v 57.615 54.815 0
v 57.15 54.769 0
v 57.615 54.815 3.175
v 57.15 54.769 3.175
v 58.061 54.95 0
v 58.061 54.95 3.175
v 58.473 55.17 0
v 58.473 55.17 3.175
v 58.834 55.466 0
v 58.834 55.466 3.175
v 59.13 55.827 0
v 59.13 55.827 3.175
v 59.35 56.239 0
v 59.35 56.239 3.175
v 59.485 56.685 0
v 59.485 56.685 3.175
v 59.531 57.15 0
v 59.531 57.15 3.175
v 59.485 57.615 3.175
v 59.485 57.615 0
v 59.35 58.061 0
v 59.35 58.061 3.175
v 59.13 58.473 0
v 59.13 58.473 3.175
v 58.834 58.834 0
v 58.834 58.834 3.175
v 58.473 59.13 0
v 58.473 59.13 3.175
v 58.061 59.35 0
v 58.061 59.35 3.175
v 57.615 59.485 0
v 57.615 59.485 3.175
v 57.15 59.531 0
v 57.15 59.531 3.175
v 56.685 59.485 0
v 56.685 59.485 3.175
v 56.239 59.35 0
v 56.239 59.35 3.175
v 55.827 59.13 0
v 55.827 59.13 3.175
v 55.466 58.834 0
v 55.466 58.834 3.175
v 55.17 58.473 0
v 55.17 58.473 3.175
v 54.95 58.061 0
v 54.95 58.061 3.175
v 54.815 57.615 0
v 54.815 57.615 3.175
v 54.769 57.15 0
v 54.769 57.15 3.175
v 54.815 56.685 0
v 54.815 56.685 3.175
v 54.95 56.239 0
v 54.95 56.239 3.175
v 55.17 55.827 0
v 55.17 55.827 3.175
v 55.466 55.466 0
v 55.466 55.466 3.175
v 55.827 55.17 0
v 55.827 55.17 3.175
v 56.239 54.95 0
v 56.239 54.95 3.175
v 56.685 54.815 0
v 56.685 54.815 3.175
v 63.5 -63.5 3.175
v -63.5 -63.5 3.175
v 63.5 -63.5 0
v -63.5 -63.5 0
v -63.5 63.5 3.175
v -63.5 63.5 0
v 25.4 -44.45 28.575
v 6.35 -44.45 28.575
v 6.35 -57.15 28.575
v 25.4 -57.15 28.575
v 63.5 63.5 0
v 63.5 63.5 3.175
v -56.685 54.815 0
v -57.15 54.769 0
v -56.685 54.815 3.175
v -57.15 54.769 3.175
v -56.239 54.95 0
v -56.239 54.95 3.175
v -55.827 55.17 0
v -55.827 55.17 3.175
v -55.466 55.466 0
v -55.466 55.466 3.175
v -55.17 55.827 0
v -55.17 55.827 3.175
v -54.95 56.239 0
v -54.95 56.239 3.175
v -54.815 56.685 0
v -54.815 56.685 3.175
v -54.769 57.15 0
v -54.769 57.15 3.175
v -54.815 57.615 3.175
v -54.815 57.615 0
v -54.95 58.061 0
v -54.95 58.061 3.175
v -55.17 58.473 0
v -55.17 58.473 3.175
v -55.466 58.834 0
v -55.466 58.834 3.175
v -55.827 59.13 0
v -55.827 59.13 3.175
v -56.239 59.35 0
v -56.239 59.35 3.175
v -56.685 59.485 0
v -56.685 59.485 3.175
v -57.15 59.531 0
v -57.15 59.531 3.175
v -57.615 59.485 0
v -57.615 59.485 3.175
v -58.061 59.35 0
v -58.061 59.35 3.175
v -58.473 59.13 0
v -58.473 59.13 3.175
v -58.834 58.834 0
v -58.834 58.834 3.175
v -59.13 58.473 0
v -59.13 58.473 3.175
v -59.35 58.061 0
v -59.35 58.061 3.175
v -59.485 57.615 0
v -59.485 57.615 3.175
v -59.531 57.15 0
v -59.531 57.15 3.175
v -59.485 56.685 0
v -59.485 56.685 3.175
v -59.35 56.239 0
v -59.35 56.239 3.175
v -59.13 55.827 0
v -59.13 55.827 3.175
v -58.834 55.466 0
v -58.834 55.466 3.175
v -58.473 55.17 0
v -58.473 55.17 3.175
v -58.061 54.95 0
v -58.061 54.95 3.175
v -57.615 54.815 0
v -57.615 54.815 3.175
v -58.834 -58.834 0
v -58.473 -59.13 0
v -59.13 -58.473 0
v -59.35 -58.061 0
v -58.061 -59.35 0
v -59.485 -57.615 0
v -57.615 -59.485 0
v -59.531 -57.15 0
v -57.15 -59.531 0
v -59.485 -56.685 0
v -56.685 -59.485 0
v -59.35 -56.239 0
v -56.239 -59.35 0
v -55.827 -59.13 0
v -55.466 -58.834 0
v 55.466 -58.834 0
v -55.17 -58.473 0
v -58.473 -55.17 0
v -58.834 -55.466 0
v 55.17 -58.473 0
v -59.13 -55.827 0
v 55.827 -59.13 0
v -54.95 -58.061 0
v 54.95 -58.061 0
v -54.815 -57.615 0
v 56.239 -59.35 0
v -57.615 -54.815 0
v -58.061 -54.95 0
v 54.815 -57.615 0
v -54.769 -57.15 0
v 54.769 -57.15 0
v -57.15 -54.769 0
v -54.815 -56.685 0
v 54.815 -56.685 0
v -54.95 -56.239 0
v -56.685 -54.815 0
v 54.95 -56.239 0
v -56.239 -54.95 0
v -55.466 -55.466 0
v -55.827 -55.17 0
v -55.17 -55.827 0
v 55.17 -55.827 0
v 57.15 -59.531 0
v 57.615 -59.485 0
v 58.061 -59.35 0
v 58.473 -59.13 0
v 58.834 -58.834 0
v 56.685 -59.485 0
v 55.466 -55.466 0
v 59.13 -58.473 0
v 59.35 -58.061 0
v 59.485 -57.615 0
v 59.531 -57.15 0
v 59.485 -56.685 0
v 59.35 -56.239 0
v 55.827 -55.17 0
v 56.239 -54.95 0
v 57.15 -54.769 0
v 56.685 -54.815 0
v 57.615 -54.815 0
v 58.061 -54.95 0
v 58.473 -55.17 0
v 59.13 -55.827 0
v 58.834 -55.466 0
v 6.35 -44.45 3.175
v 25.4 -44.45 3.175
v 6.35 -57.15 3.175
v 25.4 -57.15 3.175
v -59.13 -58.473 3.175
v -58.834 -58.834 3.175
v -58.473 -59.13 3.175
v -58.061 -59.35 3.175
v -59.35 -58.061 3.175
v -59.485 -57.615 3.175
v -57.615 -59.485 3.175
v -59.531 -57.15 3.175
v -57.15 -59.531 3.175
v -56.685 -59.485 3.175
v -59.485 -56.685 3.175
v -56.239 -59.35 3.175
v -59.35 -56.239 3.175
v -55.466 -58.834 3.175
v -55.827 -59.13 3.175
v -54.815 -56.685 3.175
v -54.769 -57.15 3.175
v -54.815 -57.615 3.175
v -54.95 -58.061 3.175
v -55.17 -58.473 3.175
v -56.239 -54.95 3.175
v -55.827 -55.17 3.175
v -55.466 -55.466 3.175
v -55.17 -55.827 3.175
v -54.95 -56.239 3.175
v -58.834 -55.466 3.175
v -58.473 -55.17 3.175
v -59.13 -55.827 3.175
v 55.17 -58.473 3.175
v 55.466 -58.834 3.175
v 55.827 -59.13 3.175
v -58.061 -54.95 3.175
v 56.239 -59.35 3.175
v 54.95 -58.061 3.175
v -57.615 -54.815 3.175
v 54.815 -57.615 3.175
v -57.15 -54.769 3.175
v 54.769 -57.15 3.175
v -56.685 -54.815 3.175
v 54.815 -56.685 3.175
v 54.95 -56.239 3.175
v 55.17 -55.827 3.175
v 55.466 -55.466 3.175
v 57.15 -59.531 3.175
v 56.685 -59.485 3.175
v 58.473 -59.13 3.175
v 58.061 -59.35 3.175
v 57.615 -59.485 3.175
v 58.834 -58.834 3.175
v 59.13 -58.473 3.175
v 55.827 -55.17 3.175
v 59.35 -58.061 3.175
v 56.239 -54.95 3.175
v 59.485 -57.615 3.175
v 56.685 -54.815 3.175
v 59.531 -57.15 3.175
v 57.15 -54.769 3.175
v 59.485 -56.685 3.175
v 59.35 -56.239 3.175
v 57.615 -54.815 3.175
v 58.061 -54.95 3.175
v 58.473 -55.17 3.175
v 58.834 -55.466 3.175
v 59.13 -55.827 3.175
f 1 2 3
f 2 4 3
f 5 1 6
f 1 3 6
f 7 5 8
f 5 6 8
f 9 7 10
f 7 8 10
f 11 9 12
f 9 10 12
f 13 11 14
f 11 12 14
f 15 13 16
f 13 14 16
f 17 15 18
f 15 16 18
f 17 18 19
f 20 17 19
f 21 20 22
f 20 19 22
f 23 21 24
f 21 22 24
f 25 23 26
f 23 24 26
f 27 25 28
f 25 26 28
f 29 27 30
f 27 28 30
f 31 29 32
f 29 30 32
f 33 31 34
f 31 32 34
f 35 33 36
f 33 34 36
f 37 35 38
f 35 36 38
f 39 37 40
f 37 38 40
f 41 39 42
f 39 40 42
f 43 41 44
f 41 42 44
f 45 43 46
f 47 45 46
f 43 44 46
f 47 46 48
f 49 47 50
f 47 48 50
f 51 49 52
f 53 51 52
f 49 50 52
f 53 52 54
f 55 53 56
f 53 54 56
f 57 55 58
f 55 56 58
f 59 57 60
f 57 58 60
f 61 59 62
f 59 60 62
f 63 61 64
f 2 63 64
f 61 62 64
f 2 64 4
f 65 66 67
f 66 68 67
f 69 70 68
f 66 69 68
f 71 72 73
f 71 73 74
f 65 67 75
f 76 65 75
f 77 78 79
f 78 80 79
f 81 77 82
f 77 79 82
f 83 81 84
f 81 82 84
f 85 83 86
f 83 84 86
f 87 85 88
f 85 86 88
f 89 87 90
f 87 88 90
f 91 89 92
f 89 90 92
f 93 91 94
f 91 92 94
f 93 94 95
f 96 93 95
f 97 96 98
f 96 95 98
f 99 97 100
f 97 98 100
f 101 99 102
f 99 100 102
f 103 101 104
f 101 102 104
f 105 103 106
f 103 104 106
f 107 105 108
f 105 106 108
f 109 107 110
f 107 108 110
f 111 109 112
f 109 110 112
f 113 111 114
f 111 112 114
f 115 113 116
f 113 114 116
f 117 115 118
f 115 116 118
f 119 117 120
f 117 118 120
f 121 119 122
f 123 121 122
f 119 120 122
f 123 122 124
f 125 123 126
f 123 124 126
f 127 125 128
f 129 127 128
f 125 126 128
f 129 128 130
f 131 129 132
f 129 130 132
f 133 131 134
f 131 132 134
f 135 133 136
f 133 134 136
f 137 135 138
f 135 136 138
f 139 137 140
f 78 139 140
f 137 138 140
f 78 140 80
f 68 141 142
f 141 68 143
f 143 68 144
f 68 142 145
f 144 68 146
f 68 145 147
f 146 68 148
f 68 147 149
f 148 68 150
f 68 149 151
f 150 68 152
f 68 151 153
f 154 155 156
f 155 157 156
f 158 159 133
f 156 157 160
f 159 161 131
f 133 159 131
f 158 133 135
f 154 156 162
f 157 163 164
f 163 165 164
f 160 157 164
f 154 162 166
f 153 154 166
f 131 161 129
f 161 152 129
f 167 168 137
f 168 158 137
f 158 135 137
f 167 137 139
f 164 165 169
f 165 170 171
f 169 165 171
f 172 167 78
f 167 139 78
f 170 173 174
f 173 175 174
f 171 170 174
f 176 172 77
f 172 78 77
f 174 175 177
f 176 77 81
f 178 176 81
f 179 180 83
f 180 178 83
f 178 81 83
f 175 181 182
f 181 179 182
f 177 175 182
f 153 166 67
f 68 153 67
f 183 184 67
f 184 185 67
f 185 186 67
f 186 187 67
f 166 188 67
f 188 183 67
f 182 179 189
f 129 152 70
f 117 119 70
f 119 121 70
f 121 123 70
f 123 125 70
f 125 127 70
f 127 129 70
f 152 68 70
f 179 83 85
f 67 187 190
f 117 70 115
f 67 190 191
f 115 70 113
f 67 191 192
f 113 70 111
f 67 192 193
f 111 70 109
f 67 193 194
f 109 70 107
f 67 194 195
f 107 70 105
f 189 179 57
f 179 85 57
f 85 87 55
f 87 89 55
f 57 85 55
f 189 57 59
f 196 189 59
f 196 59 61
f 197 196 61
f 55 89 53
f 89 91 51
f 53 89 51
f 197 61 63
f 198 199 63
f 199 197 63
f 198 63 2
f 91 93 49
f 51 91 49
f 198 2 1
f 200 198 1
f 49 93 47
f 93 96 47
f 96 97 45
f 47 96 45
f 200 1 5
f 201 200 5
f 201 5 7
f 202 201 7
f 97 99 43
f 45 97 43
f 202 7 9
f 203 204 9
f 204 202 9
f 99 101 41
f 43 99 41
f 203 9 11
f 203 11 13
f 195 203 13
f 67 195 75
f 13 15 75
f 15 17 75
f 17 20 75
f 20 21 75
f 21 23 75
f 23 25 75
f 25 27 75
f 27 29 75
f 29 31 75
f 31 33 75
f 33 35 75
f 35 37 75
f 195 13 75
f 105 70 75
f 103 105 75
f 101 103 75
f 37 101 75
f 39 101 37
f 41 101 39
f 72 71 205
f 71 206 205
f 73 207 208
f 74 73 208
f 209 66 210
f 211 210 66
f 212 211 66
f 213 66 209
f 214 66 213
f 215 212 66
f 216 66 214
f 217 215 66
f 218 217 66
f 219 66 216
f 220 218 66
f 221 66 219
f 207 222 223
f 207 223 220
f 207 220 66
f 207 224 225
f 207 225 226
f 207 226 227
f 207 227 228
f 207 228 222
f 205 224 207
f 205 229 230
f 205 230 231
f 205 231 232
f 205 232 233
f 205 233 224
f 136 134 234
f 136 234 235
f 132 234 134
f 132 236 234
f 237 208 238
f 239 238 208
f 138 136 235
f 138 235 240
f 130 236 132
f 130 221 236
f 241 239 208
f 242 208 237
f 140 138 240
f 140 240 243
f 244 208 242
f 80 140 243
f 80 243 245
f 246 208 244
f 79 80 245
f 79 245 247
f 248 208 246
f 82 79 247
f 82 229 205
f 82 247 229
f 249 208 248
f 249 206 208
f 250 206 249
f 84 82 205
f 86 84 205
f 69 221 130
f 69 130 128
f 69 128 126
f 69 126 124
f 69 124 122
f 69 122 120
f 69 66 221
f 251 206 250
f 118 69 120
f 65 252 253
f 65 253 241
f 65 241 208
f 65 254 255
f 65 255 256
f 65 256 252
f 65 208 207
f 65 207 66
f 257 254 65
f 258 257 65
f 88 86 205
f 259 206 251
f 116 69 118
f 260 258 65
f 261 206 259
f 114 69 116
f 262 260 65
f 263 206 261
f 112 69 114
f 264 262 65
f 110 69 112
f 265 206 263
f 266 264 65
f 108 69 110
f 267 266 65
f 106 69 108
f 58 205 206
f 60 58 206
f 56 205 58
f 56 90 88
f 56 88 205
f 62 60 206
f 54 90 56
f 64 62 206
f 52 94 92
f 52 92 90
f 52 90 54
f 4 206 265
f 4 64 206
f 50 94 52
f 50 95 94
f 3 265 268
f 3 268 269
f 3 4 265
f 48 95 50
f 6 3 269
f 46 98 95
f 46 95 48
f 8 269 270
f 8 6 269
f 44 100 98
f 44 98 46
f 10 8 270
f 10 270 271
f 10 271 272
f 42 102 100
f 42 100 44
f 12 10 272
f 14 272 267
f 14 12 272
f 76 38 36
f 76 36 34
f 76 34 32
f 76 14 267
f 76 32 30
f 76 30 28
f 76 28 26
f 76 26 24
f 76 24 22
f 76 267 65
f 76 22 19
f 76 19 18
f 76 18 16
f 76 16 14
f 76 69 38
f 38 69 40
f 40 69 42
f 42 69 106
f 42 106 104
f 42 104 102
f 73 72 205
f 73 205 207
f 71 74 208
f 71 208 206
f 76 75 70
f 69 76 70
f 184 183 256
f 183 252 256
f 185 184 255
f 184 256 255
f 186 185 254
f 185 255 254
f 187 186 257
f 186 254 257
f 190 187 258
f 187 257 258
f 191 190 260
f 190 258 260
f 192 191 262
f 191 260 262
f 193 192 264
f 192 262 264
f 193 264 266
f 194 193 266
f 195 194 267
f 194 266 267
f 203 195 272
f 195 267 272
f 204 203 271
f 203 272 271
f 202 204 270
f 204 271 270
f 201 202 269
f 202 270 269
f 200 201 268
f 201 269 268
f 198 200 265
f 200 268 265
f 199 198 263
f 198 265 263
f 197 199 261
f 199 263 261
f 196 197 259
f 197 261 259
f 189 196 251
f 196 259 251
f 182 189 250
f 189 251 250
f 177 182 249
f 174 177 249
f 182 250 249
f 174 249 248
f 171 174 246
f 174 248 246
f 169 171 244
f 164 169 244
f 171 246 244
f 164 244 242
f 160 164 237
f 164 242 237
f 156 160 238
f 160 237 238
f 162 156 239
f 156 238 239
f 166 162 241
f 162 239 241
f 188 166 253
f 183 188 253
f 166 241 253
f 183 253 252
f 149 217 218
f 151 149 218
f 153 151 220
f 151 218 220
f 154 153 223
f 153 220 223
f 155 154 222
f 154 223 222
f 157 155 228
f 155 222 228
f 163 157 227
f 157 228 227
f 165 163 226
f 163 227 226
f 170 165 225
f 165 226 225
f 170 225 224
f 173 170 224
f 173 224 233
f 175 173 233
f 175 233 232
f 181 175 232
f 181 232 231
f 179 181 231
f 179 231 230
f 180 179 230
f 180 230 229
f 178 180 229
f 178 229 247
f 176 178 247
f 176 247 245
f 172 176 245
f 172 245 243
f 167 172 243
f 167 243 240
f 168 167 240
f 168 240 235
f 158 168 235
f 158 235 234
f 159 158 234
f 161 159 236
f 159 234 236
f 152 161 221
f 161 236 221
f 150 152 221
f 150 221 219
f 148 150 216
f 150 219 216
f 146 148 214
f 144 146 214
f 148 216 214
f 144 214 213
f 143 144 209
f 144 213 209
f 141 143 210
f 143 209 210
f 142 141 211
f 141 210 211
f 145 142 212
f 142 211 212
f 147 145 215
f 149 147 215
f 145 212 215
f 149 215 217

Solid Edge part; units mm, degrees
sketch "Sketch1" plane through (0, 0, 0) normal (0, 0, 1) x (1, 0, 0)
  line L0 (-63.5, -63.5) -> (63.5, -63.5)
  line L1 (63.5, -63.5) -> (63.5, 63.5)
  line L2 (63.5, 63.5) -> (-63.5, 63.5)
  line L3 (-63.5, 63.5) -> (-63.5, -63.5)
  dimension "D1" = 127
  dimension "D2" = 127
extrude "Protrusion1" add sketch "Sketch1" along normal blind 3.175
hole "Hole_1" at (-57.15, 57.15, 3.175) direction (0, 0, -1) diameter 4.7625 end up to next
hole "Hole1" at (57.15, 57.15, 3.175) direction (0, 0, -1) diameter 4.7625 end up to next
hole "Hole2" at (57.15, -57.15, 3.175) direction (0, 0, -1) diameter 4.7625 end up to next
hole "Hole3" at (-57.15, -57.15, 3.175) direction (0, 0, -1) diameter 4.7625 end up to next
sketch "Sketch2" plane through (0, 0, 3.175) normal (0, 0, 1) x (0, -1, 0)
  line L0 (44.45, 6.35) -> (57.15, 6.35)
  line L1 (57.15, 6.35) -> (57.15, 25.4)
  line L2 (57.15, 25.4) -> (44.45, 25.4)
  line L3 (44.45, 25.4) -> (44.45, 6.35)
  dimension "D1" = 6.35
  dimension "D2" = 12.7
  dimension "D3" = 19.05
  dimension "D4" = 38.1
extrude "ExtrudedProtrusion_2" add sketch "Sketch2" along normal blind 25.4
properties material "ABS Plastic, high impact"
